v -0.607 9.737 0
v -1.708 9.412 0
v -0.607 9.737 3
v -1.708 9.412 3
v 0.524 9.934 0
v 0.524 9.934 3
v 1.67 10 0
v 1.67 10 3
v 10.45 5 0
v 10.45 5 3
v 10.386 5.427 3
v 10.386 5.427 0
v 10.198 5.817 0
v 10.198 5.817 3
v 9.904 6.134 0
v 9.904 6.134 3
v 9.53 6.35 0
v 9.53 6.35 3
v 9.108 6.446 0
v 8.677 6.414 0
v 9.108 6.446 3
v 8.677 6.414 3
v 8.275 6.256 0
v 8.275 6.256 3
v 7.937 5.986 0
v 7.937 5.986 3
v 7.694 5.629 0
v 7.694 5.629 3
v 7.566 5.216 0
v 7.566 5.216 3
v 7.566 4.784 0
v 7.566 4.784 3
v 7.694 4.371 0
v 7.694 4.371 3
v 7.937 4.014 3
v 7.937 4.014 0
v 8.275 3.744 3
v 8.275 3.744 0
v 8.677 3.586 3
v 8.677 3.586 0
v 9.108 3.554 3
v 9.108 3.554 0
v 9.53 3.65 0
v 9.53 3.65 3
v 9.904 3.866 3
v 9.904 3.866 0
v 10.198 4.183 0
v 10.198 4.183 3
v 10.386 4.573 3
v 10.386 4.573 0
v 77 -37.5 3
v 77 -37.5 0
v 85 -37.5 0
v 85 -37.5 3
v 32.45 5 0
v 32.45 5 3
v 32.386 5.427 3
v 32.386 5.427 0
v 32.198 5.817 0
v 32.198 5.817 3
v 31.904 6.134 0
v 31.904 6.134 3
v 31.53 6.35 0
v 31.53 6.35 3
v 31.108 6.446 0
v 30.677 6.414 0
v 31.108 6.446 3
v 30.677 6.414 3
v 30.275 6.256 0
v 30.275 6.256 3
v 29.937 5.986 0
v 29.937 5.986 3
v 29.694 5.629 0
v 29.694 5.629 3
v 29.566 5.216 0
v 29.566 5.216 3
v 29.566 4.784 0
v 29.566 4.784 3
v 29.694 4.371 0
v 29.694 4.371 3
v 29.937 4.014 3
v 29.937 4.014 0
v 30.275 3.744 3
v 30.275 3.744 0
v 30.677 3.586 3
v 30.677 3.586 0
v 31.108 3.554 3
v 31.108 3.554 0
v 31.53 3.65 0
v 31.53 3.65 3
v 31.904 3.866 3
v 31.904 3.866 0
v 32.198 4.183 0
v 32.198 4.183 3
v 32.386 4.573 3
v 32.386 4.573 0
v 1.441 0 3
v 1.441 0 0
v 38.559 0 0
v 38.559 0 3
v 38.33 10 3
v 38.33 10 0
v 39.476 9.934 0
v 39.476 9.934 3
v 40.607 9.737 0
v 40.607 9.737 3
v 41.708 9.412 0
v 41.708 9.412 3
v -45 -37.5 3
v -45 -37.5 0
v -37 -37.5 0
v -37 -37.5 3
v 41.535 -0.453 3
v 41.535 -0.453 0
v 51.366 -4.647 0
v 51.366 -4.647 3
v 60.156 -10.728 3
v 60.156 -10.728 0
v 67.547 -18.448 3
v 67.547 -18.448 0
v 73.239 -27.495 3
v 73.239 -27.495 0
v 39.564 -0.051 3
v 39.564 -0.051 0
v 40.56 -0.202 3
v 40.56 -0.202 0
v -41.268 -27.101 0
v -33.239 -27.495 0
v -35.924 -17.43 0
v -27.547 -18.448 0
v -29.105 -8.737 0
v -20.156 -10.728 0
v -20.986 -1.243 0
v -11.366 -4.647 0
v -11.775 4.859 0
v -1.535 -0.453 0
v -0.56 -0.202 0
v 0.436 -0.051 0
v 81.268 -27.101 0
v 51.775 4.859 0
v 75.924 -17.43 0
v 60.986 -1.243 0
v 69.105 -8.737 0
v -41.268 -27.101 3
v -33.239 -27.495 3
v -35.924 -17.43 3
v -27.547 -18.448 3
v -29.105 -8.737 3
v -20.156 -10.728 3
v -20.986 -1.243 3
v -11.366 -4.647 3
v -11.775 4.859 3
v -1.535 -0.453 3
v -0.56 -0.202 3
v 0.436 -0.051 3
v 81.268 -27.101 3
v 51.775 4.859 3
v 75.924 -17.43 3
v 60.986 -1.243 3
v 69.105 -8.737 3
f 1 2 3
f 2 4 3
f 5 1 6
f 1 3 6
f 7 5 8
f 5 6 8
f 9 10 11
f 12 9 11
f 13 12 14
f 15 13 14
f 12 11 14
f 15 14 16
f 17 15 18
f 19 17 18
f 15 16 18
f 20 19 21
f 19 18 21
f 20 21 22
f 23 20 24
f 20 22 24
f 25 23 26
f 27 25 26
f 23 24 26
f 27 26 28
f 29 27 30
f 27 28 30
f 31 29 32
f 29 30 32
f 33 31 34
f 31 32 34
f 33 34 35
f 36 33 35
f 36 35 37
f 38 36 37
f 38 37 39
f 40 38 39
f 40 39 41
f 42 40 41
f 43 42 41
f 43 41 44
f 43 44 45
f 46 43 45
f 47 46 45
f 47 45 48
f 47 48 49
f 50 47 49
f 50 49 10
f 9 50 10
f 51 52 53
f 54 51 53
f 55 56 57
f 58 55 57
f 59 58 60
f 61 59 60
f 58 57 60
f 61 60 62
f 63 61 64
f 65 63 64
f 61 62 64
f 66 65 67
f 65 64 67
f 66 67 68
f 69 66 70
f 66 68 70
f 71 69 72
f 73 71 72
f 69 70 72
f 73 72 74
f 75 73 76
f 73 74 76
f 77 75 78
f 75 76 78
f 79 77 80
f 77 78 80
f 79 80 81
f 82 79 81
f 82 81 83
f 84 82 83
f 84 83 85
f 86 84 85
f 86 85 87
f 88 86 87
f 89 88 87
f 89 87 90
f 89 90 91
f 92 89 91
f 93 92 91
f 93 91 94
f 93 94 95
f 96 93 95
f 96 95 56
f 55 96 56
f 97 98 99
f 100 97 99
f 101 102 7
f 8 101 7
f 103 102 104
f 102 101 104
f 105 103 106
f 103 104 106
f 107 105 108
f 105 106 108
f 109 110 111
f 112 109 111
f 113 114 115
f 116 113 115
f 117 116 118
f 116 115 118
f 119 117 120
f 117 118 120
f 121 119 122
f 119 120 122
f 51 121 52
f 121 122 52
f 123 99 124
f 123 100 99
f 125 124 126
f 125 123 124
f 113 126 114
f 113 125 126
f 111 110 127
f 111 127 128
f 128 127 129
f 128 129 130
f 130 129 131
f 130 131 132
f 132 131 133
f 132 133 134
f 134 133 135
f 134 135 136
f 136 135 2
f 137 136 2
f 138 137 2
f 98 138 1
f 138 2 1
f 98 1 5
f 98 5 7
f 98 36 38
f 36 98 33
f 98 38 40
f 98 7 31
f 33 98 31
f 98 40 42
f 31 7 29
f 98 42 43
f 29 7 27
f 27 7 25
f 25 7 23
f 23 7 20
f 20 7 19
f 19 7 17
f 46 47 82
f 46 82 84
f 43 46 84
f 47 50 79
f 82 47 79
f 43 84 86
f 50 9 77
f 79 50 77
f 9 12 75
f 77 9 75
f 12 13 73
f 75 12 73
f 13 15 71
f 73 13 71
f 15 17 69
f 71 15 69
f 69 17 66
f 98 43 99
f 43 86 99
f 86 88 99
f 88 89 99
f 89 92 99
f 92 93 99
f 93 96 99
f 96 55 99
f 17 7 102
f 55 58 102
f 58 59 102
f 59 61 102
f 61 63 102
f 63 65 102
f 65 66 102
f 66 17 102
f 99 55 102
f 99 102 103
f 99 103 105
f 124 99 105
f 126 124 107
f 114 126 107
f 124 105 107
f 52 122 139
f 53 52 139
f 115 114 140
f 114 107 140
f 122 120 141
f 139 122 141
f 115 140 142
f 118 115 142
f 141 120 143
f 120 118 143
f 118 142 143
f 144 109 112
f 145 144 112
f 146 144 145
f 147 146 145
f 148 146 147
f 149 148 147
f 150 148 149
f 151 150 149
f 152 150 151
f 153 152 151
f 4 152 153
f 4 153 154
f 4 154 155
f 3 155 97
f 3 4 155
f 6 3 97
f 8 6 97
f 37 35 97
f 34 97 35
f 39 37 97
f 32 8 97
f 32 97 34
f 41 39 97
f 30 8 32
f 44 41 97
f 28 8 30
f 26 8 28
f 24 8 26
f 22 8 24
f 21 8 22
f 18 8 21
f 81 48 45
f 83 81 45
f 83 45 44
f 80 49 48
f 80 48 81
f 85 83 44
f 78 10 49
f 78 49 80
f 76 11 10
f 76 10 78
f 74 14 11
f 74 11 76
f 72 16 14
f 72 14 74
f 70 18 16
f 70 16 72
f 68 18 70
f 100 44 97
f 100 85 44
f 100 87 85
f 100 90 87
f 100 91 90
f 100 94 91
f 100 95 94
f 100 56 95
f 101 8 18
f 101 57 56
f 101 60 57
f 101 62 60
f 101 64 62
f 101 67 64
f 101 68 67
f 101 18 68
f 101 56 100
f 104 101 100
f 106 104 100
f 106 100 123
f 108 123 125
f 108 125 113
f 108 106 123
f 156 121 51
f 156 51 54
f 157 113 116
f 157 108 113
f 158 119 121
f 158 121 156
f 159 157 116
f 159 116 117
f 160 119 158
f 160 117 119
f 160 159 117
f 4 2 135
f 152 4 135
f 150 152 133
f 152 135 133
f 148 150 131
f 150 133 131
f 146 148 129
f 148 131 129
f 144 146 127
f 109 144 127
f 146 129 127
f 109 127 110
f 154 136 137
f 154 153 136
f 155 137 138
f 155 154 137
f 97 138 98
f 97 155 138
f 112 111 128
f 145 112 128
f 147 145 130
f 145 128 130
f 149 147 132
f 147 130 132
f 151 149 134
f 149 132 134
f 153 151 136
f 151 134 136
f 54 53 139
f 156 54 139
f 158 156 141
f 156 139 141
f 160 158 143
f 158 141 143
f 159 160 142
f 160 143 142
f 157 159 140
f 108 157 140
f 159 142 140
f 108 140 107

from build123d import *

# Parameters (mm, degrees)
EXTRUDE_1_DEPTH     = 3
SKETCH_3_R          = 1.45
CUT_EXTRUDE_2_DEPTH = 93.952945085
FILLET_1_R          = 10


with BuildPart() as part:
    # 草图1 → 凸台-拉伸1 (new body)
    with BuildSketch(Plane.XY):
        with BuildLine():
            Line((-45, -37.5), (-37, -37.5))
            ThreePointArc((-37, -37.5), (-23.489142232, -13.827379664), (0, 0))
            Line((0, 0), (40, 0))
            ThreePointArc((40, 0), (63.489142232, -13.827379664), (77, -37.5))
            Line((77, -37.5), (85, -37.5))
            ThreePointArc((85, -37.5), (68.488362784, -8.076814205), (40, 10))
            Line((40, 10), (0, 10))
            ThreePointArc((0, 10), (-28.488362784, -8.076814205), (-45, -37.5))
        make_face()
    extrude(amount=EXTRUDE_1_DEPTH)

    # 草图3 → 切除-拉伸2 (cut, through all)
    with BuildSketch(Plane.XY.offset(3)):
        with Locations((9, 5)):
            Circle(SKETCH_3_R)
        with Locations((31, 5)):
            Circle(SKETCH_3_R)
    extrude(amount=-CUT_EXTRUDE_2_DEPTH, mode=Mode.SUBTRACT)

    # 圆角1
    fillet_1_edges = [part.edges().sort_by_distance(p)[0] for p in [
        (0, 10, 1.5),
        (40, 10, 1.5),
        (40, 0, 1.5),
        (0, 0, 1.5),
    ]]
    fillet(fillet_1_edges, radius=FILLET_1_R)


solid = part.part
